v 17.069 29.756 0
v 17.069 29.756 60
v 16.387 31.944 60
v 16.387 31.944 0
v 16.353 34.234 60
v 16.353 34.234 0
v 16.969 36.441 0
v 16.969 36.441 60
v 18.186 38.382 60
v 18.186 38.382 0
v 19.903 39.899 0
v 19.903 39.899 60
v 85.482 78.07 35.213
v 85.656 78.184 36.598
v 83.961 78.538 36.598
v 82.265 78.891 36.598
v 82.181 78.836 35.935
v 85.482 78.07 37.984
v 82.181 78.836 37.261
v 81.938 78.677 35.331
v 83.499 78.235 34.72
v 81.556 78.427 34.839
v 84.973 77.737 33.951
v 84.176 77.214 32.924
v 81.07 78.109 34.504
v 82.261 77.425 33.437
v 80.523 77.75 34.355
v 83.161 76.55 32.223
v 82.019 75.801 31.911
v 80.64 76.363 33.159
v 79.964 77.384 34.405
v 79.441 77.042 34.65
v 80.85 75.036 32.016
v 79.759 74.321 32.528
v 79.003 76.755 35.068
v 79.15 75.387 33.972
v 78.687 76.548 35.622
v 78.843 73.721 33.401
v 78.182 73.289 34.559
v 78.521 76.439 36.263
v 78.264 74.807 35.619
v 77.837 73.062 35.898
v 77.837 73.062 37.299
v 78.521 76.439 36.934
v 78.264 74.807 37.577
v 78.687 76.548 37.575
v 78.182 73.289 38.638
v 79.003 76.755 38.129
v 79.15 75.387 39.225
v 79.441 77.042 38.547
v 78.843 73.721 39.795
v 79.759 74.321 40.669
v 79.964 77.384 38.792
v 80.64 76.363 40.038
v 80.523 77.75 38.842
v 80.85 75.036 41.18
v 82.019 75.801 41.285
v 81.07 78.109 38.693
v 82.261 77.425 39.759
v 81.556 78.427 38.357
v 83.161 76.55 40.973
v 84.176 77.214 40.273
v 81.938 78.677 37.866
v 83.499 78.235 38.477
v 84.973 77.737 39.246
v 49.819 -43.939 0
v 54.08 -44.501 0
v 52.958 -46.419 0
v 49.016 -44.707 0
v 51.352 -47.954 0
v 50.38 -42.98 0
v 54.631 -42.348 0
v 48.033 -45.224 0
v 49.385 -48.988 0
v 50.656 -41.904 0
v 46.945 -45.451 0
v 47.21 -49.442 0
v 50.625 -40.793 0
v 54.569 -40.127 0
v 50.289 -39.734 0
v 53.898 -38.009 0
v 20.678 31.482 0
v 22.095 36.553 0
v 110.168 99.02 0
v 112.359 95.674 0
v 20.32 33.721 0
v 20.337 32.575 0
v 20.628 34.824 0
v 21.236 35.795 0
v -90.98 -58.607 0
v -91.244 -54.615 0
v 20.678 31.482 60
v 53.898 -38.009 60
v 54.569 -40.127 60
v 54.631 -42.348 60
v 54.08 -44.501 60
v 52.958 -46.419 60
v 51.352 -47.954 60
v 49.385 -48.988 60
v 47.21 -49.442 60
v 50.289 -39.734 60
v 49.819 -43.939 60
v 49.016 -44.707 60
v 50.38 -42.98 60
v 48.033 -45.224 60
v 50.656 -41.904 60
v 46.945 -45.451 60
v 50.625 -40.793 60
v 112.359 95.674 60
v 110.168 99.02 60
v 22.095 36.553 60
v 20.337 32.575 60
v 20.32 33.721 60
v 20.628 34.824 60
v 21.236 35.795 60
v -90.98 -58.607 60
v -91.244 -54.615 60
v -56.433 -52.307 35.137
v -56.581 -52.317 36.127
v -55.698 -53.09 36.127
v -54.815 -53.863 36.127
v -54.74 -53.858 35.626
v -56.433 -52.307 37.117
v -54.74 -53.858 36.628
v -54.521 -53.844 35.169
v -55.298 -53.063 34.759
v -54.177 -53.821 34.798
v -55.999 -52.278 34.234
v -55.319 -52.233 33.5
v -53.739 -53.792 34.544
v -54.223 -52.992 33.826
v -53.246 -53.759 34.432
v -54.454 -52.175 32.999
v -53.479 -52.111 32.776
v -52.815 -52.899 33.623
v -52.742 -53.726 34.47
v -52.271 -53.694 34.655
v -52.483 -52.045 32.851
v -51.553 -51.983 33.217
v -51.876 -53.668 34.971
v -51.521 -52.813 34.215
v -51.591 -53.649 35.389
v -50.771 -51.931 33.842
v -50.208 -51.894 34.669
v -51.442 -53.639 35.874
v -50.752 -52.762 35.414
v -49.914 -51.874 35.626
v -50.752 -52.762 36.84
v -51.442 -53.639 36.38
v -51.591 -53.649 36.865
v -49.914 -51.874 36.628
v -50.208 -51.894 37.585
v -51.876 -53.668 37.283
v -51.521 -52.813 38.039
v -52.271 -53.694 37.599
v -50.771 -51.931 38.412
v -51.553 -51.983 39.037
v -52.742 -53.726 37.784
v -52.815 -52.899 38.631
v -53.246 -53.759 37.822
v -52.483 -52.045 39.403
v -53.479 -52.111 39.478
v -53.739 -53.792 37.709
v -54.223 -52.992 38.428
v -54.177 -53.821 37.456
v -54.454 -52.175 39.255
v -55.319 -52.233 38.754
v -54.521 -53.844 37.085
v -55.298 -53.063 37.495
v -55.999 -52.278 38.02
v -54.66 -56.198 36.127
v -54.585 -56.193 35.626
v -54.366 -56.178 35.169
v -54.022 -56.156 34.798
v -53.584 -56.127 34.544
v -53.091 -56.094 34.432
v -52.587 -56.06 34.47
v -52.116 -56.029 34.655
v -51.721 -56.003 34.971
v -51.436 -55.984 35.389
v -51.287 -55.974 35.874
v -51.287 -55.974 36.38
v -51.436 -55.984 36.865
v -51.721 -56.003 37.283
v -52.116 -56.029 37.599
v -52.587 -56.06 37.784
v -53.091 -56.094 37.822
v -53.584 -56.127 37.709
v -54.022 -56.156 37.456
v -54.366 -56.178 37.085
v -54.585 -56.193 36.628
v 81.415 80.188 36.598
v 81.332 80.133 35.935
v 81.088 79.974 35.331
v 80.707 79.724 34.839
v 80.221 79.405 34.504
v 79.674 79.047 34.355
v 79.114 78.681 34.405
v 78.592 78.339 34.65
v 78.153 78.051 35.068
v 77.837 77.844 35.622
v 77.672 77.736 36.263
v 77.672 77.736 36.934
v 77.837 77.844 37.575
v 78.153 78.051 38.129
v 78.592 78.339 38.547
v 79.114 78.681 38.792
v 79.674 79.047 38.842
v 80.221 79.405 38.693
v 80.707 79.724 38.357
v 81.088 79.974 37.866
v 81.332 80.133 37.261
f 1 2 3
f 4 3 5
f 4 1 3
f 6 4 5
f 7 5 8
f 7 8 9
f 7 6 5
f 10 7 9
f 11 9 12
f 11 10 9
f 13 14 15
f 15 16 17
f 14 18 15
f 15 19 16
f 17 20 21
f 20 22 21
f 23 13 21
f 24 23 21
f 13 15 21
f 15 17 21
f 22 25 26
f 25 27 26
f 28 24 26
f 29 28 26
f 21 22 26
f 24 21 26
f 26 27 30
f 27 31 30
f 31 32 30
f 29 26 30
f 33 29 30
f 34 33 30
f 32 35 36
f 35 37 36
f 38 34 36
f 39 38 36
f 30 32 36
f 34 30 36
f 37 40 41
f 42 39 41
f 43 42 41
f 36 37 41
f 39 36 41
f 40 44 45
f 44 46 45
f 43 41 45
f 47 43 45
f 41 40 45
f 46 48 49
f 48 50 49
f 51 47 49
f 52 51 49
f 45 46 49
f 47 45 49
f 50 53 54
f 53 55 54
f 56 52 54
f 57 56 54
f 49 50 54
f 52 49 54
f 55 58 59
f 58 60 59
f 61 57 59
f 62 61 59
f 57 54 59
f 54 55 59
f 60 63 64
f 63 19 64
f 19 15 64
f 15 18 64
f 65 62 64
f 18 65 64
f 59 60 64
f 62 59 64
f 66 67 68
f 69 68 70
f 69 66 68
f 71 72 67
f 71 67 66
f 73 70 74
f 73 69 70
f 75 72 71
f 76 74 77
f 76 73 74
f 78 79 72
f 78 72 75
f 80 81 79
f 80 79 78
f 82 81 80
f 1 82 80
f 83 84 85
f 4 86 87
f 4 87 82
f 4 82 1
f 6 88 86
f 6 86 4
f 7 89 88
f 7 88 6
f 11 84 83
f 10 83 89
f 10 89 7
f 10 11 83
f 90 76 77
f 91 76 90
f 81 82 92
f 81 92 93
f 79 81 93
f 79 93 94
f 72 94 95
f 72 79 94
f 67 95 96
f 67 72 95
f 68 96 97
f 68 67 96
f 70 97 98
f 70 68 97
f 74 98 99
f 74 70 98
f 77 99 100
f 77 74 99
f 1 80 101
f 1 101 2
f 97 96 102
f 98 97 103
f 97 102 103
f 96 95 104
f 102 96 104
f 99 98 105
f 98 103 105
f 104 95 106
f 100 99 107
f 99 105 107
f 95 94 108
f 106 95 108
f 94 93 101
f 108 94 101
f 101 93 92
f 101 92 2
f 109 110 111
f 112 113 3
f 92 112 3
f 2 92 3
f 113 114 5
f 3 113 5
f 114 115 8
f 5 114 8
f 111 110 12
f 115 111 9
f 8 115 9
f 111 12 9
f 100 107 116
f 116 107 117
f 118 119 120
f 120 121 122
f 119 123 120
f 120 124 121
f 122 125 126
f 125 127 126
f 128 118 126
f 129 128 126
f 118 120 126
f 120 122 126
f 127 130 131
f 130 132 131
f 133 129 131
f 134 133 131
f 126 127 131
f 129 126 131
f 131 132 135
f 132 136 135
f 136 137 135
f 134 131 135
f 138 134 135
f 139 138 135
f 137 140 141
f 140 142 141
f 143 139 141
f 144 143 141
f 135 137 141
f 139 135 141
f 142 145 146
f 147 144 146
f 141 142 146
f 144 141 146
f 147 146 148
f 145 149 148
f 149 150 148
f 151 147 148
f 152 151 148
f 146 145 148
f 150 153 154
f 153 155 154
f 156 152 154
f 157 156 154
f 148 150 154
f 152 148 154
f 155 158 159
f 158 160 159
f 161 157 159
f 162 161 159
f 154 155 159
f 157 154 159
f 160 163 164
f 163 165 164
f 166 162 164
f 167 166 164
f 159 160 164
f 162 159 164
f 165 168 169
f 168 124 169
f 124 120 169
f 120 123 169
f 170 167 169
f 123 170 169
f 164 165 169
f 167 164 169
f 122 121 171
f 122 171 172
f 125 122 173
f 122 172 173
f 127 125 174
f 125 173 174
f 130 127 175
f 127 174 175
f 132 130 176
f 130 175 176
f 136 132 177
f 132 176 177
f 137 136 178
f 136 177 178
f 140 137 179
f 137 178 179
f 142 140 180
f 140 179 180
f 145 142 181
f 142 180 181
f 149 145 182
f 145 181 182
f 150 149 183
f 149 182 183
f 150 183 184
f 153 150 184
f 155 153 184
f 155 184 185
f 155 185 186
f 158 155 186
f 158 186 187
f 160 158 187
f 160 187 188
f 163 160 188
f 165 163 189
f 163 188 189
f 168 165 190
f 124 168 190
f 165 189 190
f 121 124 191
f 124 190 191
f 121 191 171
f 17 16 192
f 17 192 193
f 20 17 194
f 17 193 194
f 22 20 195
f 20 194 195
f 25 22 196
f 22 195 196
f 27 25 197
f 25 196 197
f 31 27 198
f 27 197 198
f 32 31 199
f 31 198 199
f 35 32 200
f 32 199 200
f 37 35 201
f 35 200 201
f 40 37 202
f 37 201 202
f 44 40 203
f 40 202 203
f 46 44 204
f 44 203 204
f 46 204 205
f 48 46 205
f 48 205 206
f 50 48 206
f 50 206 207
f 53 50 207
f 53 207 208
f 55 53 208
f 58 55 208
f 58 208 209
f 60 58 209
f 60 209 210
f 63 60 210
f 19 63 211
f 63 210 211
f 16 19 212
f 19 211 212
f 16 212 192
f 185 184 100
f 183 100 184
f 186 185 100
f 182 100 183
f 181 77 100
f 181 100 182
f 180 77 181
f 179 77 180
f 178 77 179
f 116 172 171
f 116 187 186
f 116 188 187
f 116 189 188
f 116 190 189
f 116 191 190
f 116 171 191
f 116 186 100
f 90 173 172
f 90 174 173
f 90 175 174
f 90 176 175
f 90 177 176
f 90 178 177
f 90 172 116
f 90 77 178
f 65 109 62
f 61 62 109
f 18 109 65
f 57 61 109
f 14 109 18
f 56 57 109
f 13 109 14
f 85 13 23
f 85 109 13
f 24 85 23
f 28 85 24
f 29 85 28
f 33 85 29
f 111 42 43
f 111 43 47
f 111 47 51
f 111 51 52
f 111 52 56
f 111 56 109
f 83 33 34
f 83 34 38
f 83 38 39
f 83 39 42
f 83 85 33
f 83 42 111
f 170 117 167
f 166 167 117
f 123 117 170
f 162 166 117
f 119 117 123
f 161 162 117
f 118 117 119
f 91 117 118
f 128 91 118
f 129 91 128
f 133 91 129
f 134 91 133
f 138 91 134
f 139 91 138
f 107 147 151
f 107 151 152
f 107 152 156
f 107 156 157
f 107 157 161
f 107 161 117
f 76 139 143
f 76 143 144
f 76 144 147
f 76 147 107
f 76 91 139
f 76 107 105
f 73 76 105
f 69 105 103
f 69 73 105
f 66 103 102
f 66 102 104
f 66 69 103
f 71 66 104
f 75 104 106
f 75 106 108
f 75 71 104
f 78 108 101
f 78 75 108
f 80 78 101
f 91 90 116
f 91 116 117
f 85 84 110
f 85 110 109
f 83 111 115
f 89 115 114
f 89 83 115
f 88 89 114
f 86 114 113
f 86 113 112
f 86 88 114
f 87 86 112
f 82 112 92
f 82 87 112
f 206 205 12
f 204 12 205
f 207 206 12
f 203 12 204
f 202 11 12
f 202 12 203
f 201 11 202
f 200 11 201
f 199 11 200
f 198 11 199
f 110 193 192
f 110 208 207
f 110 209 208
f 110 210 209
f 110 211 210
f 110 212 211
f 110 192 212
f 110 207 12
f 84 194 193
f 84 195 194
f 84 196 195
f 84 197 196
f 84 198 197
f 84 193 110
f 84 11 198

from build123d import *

# Parameters (mm, degrees)
BASE_FLANGE1_DEPTH                                   = 60
CSK_FOR_M3_HEX_SOCKET_COUNTERSUNK_CAP_SC_D           = 3.4
CSK_FOR_M3_HEX_SOCKET_COUNTERSUNK_CAP_SC_CSINK_D     = 6.72
CSK_FOR_M3_HEX_SOCKET_COUNTERSUNK_CAP_SC_CSINK_ANGLE = 90
CSK_FOR_M4_COUNTERSUNK_RAISED_HEAD_SCREW_D           = 4.5
CSK_FOR_M4_COUNTERSUNK_RAISED_HEAD_SCREW_CSINK_D     = 9.4
CSK_FOR_M4_COUNTERSUNK_RAISED_HEAD_SCREW_CSINK_ANGLE = 90


# Sheet-metal steps are written as plain solids
with BuildPart() as part:
    # Sketch1 → Base-Flange1 (new body)
    with BuildSketch(Plane.XY):
        with BuildLine():
            Line((-91.244236532, -54.615390039), (46.945285338, -45.450675325))
            ThreePointArc((46.945285338, -45.450675325), (50.13319854, -43.479214131), (50.289406158, -39.734210927))
            Line((50.289406158, -39.734210927), (17.068758356, 29.75632288))
            ThreePointArc((17.068758356, 29.75632288), (16.581579748, 35.359878725), (19.903130417, 39.899094764))
            Line((19.903130417, 39.899094764), (110.167579221, 99.019669419))
            Line((110.167579221, 99.019669419), (112.359212119, 95.673515621))
            Line((112.359212119, 95.673515621), (22.094763314, 36.552940965))
            ThreePointArc((22.094763314, 36.552940965), (20.43398798, 34.283332946), (20.677577284, 31.481555023))
            Line((20.677577284, 31.481555023), (53.898225085, -38.008978784))
            ThreePointArc((53.898225085, -38.008978784), (53.585809851, -45.498985193), (47.209983446, -49.44190758))
            Line((47.209983446, -49.44190758), (-90.979538424, -58.606622294))
            Line((-90.979538424, -58.606622294), (-91.244236532, -54.615390039))
        make_face()
    extrude(amount=BASE_FLANGE1_DEPTH)

    # CSK for M3 Hex Socket Countersunk Cap Screw1 (through all)
    with Locations(Plane(origin=(3.206660902, -48.351416347, 0), x_dir=(0.9978080636970287, 0.06617452698120734, 0), z_dir=(-0.06617452698120732, 0.9978080636970286, 0))):
        with Locations((-56.559497038, -36.126961684)):
            CounterSinkHole(CSK_FOR_M3_HEX_SOCKET_COUNTERSUNK_CAP_SC_D / 2, CSK_FOR_M3_HEX_SOCKET_COUNTERSUNK_CAP_SC_CSINK_D / 2, counter_sink_angle=CSK_FOR_M3_HEX_SOCKET_COUNTERSUNK_CAP_SC_CSINK_ANGLE)

    # CSK for M4 Countersunk Raised Head Screw1 (through all)
    with Locations(Plane(origin=(-10.120981557, 15.452570055, 0), x_dir=(-0.836538449635925, -0.5479082243229453, 0), z_dir=(0.5479082243229453, -0.836538449635925, 0))):
        with Locations((-109.792583779, -36.598273193)):
            CounterSinkHole(CSK_FOR_M4_COUNTERSUNK_RAISED_HEAD_SCREW_D / 2, CSK_FOR_M4_COUNTERSUNK_RAISED_HEAD_SCREW_CSINK_D / 2, counter_sink_angle=CSK_FOR_M4_COUNTERSUNK_RAISED_HEAD_SCREW_CSINK_ANGLE)


solid = part.part
